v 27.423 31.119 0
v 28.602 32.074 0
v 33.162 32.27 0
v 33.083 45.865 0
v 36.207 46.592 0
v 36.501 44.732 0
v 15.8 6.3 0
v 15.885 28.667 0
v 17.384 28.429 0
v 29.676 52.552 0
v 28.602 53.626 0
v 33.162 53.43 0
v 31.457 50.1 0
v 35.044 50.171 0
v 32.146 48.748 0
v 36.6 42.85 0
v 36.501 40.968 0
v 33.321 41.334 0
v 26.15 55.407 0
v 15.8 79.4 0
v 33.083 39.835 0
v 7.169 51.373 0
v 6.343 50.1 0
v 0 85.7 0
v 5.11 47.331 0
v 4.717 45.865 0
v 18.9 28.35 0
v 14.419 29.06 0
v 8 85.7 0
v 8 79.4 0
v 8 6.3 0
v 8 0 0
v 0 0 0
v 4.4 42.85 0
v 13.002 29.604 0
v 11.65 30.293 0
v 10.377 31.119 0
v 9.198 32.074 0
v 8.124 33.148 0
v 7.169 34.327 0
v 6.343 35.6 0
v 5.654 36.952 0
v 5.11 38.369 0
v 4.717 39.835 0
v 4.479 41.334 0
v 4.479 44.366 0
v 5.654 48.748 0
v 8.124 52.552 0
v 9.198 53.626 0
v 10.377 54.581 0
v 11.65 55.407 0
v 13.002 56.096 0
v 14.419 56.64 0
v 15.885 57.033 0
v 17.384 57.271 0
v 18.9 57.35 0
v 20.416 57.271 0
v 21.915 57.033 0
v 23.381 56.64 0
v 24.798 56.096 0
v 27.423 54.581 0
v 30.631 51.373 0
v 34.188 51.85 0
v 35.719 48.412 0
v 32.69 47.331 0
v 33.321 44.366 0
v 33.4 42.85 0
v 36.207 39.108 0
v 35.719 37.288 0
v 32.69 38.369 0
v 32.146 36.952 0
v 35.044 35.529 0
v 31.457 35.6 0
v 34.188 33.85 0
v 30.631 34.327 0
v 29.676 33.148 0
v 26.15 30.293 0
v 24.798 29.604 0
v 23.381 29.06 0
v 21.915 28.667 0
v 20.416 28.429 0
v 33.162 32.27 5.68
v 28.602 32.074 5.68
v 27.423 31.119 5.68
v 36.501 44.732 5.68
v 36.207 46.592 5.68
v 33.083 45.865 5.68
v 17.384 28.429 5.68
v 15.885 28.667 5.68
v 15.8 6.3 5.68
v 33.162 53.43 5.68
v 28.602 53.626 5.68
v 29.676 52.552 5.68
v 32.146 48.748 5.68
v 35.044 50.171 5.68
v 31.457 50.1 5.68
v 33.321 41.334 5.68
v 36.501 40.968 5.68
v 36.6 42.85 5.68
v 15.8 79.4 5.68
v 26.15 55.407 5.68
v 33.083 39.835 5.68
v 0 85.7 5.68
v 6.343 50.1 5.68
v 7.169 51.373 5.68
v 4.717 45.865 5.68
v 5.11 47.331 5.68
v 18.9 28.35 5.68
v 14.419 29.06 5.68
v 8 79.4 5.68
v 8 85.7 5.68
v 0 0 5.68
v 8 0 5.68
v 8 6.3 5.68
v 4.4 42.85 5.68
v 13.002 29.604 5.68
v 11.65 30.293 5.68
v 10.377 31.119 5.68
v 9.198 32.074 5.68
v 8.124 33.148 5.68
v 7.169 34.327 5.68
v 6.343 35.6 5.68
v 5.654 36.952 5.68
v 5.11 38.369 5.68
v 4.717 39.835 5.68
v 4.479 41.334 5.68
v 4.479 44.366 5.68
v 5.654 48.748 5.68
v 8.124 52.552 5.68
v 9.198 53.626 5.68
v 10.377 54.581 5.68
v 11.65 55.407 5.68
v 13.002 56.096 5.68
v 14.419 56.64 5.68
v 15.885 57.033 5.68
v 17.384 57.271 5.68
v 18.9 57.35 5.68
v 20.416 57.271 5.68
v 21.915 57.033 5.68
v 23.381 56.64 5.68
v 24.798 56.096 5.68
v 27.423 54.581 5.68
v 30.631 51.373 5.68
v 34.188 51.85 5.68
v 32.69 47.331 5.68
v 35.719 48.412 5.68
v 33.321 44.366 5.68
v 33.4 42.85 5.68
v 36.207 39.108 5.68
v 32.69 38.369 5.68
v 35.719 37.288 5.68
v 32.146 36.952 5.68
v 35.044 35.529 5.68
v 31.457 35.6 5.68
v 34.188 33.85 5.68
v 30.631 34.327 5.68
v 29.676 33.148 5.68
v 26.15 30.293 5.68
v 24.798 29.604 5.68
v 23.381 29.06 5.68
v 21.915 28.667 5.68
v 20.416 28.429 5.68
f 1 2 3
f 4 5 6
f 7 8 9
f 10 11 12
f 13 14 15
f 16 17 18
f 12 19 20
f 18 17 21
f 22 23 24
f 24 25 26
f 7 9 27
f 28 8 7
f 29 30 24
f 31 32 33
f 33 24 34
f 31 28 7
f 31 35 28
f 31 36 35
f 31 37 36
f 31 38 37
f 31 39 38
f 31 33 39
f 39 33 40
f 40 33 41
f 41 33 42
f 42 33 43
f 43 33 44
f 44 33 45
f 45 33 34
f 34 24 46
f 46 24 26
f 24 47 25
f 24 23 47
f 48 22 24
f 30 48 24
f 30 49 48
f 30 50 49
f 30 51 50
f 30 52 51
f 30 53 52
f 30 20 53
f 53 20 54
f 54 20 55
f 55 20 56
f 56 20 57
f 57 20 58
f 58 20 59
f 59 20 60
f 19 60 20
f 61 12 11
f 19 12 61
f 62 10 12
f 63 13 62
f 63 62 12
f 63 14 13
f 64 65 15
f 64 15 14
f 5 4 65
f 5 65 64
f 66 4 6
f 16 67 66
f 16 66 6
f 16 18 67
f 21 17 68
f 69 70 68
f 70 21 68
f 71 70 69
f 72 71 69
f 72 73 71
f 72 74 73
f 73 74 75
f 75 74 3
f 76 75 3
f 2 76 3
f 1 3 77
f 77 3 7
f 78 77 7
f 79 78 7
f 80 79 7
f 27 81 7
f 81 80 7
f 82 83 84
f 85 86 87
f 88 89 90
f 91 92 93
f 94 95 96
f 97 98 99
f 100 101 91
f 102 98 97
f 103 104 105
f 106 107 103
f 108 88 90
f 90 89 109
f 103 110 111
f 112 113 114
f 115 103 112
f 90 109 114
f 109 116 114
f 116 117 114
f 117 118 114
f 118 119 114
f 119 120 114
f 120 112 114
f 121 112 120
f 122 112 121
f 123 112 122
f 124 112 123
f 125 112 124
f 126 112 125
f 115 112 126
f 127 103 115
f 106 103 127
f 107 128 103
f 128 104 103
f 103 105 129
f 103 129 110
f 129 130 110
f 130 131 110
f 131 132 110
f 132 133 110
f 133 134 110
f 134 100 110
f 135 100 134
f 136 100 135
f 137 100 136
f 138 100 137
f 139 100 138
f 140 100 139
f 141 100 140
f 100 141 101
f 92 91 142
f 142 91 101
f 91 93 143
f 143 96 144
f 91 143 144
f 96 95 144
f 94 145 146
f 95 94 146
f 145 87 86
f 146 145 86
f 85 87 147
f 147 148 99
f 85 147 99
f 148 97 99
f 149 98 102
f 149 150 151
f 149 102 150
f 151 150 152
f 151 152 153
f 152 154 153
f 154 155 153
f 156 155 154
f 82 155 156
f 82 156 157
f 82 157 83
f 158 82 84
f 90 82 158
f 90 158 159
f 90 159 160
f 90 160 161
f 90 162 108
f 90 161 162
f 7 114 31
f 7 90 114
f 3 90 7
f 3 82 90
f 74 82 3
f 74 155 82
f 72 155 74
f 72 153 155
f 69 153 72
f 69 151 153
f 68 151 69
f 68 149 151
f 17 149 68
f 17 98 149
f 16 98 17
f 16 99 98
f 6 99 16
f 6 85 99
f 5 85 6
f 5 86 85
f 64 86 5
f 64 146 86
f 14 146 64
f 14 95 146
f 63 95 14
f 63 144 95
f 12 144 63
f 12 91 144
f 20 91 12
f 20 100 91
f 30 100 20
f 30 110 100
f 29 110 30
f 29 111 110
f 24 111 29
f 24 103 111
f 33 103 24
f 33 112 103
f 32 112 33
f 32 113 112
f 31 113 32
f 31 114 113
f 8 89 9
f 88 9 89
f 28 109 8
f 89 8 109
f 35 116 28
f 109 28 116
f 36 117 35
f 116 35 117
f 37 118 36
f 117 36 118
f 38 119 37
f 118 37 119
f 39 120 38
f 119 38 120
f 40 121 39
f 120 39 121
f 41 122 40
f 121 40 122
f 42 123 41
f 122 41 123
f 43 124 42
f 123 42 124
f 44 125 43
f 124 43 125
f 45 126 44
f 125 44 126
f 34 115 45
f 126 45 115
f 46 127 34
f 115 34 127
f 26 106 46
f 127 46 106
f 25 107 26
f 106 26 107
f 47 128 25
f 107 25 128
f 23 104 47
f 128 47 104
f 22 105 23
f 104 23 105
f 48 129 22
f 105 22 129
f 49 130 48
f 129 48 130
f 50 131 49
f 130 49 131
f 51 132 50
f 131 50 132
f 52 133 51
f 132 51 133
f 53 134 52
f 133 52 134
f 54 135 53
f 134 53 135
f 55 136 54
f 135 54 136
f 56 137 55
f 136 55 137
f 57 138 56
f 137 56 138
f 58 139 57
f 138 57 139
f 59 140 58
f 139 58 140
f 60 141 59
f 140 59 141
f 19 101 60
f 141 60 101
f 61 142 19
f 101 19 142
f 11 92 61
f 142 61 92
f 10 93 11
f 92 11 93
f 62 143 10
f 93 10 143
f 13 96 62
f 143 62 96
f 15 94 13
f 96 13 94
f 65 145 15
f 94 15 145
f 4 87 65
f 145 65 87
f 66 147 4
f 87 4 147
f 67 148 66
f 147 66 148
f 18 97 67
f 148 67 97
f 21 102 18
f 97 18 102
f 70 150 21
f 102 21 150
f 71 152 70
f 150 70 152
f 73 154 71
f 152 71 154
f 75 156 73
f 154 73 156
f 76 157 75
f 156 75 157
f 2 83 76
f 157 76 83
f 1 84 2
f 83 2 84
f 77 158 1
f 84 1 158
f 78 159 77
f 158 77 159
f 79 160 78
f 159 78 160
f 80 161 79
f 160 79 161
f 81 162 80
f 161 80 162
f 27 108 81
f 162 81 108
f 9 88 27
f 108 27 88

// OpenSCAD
// speakerShelf: shelf to hold speaker flush to top platform

// Definitions (all lengths are in millimeters)
botWidth=85.7; //the width from left side to right of the robot
tabDepth=8;    //the width of the openings on left and right sides
tabLength=6.3; //how long tabs are compared to the rest


// this module defines a 2D shape that we'll then
// extrude to the desired thickness
module speakerShelf() {
  difference() { //the main shape is defined by the union()
                 //and this difference allows us to cut a
                 //circle out of the middle

    union() {
      //there are two parts to this main shape:
      //  -The first part is a long rectangle for the "tabs"
      //  -The second part is the "wing" to hold the speaker
      
      //First part:
      square([tabDepth,botWidth]);

      //Second part (a "hull" combination of two shapes):
      hull() { //This wraps a "hull" around two shapes:
        translate([0,tabLength])
                 square([15.8,botWidth-2*tabLength]);
        translate([18.6,botWidth/2]) circle(r=18, $fn=60);
      } //end of hull
    } //end of union

    //what we're cutting out (based on the difference function):
    translate([18.9,botWidth/2]) circle(r=14.5, $fn=60);
  }
}

linear_extrude(height=5.68) speakerShelf();
